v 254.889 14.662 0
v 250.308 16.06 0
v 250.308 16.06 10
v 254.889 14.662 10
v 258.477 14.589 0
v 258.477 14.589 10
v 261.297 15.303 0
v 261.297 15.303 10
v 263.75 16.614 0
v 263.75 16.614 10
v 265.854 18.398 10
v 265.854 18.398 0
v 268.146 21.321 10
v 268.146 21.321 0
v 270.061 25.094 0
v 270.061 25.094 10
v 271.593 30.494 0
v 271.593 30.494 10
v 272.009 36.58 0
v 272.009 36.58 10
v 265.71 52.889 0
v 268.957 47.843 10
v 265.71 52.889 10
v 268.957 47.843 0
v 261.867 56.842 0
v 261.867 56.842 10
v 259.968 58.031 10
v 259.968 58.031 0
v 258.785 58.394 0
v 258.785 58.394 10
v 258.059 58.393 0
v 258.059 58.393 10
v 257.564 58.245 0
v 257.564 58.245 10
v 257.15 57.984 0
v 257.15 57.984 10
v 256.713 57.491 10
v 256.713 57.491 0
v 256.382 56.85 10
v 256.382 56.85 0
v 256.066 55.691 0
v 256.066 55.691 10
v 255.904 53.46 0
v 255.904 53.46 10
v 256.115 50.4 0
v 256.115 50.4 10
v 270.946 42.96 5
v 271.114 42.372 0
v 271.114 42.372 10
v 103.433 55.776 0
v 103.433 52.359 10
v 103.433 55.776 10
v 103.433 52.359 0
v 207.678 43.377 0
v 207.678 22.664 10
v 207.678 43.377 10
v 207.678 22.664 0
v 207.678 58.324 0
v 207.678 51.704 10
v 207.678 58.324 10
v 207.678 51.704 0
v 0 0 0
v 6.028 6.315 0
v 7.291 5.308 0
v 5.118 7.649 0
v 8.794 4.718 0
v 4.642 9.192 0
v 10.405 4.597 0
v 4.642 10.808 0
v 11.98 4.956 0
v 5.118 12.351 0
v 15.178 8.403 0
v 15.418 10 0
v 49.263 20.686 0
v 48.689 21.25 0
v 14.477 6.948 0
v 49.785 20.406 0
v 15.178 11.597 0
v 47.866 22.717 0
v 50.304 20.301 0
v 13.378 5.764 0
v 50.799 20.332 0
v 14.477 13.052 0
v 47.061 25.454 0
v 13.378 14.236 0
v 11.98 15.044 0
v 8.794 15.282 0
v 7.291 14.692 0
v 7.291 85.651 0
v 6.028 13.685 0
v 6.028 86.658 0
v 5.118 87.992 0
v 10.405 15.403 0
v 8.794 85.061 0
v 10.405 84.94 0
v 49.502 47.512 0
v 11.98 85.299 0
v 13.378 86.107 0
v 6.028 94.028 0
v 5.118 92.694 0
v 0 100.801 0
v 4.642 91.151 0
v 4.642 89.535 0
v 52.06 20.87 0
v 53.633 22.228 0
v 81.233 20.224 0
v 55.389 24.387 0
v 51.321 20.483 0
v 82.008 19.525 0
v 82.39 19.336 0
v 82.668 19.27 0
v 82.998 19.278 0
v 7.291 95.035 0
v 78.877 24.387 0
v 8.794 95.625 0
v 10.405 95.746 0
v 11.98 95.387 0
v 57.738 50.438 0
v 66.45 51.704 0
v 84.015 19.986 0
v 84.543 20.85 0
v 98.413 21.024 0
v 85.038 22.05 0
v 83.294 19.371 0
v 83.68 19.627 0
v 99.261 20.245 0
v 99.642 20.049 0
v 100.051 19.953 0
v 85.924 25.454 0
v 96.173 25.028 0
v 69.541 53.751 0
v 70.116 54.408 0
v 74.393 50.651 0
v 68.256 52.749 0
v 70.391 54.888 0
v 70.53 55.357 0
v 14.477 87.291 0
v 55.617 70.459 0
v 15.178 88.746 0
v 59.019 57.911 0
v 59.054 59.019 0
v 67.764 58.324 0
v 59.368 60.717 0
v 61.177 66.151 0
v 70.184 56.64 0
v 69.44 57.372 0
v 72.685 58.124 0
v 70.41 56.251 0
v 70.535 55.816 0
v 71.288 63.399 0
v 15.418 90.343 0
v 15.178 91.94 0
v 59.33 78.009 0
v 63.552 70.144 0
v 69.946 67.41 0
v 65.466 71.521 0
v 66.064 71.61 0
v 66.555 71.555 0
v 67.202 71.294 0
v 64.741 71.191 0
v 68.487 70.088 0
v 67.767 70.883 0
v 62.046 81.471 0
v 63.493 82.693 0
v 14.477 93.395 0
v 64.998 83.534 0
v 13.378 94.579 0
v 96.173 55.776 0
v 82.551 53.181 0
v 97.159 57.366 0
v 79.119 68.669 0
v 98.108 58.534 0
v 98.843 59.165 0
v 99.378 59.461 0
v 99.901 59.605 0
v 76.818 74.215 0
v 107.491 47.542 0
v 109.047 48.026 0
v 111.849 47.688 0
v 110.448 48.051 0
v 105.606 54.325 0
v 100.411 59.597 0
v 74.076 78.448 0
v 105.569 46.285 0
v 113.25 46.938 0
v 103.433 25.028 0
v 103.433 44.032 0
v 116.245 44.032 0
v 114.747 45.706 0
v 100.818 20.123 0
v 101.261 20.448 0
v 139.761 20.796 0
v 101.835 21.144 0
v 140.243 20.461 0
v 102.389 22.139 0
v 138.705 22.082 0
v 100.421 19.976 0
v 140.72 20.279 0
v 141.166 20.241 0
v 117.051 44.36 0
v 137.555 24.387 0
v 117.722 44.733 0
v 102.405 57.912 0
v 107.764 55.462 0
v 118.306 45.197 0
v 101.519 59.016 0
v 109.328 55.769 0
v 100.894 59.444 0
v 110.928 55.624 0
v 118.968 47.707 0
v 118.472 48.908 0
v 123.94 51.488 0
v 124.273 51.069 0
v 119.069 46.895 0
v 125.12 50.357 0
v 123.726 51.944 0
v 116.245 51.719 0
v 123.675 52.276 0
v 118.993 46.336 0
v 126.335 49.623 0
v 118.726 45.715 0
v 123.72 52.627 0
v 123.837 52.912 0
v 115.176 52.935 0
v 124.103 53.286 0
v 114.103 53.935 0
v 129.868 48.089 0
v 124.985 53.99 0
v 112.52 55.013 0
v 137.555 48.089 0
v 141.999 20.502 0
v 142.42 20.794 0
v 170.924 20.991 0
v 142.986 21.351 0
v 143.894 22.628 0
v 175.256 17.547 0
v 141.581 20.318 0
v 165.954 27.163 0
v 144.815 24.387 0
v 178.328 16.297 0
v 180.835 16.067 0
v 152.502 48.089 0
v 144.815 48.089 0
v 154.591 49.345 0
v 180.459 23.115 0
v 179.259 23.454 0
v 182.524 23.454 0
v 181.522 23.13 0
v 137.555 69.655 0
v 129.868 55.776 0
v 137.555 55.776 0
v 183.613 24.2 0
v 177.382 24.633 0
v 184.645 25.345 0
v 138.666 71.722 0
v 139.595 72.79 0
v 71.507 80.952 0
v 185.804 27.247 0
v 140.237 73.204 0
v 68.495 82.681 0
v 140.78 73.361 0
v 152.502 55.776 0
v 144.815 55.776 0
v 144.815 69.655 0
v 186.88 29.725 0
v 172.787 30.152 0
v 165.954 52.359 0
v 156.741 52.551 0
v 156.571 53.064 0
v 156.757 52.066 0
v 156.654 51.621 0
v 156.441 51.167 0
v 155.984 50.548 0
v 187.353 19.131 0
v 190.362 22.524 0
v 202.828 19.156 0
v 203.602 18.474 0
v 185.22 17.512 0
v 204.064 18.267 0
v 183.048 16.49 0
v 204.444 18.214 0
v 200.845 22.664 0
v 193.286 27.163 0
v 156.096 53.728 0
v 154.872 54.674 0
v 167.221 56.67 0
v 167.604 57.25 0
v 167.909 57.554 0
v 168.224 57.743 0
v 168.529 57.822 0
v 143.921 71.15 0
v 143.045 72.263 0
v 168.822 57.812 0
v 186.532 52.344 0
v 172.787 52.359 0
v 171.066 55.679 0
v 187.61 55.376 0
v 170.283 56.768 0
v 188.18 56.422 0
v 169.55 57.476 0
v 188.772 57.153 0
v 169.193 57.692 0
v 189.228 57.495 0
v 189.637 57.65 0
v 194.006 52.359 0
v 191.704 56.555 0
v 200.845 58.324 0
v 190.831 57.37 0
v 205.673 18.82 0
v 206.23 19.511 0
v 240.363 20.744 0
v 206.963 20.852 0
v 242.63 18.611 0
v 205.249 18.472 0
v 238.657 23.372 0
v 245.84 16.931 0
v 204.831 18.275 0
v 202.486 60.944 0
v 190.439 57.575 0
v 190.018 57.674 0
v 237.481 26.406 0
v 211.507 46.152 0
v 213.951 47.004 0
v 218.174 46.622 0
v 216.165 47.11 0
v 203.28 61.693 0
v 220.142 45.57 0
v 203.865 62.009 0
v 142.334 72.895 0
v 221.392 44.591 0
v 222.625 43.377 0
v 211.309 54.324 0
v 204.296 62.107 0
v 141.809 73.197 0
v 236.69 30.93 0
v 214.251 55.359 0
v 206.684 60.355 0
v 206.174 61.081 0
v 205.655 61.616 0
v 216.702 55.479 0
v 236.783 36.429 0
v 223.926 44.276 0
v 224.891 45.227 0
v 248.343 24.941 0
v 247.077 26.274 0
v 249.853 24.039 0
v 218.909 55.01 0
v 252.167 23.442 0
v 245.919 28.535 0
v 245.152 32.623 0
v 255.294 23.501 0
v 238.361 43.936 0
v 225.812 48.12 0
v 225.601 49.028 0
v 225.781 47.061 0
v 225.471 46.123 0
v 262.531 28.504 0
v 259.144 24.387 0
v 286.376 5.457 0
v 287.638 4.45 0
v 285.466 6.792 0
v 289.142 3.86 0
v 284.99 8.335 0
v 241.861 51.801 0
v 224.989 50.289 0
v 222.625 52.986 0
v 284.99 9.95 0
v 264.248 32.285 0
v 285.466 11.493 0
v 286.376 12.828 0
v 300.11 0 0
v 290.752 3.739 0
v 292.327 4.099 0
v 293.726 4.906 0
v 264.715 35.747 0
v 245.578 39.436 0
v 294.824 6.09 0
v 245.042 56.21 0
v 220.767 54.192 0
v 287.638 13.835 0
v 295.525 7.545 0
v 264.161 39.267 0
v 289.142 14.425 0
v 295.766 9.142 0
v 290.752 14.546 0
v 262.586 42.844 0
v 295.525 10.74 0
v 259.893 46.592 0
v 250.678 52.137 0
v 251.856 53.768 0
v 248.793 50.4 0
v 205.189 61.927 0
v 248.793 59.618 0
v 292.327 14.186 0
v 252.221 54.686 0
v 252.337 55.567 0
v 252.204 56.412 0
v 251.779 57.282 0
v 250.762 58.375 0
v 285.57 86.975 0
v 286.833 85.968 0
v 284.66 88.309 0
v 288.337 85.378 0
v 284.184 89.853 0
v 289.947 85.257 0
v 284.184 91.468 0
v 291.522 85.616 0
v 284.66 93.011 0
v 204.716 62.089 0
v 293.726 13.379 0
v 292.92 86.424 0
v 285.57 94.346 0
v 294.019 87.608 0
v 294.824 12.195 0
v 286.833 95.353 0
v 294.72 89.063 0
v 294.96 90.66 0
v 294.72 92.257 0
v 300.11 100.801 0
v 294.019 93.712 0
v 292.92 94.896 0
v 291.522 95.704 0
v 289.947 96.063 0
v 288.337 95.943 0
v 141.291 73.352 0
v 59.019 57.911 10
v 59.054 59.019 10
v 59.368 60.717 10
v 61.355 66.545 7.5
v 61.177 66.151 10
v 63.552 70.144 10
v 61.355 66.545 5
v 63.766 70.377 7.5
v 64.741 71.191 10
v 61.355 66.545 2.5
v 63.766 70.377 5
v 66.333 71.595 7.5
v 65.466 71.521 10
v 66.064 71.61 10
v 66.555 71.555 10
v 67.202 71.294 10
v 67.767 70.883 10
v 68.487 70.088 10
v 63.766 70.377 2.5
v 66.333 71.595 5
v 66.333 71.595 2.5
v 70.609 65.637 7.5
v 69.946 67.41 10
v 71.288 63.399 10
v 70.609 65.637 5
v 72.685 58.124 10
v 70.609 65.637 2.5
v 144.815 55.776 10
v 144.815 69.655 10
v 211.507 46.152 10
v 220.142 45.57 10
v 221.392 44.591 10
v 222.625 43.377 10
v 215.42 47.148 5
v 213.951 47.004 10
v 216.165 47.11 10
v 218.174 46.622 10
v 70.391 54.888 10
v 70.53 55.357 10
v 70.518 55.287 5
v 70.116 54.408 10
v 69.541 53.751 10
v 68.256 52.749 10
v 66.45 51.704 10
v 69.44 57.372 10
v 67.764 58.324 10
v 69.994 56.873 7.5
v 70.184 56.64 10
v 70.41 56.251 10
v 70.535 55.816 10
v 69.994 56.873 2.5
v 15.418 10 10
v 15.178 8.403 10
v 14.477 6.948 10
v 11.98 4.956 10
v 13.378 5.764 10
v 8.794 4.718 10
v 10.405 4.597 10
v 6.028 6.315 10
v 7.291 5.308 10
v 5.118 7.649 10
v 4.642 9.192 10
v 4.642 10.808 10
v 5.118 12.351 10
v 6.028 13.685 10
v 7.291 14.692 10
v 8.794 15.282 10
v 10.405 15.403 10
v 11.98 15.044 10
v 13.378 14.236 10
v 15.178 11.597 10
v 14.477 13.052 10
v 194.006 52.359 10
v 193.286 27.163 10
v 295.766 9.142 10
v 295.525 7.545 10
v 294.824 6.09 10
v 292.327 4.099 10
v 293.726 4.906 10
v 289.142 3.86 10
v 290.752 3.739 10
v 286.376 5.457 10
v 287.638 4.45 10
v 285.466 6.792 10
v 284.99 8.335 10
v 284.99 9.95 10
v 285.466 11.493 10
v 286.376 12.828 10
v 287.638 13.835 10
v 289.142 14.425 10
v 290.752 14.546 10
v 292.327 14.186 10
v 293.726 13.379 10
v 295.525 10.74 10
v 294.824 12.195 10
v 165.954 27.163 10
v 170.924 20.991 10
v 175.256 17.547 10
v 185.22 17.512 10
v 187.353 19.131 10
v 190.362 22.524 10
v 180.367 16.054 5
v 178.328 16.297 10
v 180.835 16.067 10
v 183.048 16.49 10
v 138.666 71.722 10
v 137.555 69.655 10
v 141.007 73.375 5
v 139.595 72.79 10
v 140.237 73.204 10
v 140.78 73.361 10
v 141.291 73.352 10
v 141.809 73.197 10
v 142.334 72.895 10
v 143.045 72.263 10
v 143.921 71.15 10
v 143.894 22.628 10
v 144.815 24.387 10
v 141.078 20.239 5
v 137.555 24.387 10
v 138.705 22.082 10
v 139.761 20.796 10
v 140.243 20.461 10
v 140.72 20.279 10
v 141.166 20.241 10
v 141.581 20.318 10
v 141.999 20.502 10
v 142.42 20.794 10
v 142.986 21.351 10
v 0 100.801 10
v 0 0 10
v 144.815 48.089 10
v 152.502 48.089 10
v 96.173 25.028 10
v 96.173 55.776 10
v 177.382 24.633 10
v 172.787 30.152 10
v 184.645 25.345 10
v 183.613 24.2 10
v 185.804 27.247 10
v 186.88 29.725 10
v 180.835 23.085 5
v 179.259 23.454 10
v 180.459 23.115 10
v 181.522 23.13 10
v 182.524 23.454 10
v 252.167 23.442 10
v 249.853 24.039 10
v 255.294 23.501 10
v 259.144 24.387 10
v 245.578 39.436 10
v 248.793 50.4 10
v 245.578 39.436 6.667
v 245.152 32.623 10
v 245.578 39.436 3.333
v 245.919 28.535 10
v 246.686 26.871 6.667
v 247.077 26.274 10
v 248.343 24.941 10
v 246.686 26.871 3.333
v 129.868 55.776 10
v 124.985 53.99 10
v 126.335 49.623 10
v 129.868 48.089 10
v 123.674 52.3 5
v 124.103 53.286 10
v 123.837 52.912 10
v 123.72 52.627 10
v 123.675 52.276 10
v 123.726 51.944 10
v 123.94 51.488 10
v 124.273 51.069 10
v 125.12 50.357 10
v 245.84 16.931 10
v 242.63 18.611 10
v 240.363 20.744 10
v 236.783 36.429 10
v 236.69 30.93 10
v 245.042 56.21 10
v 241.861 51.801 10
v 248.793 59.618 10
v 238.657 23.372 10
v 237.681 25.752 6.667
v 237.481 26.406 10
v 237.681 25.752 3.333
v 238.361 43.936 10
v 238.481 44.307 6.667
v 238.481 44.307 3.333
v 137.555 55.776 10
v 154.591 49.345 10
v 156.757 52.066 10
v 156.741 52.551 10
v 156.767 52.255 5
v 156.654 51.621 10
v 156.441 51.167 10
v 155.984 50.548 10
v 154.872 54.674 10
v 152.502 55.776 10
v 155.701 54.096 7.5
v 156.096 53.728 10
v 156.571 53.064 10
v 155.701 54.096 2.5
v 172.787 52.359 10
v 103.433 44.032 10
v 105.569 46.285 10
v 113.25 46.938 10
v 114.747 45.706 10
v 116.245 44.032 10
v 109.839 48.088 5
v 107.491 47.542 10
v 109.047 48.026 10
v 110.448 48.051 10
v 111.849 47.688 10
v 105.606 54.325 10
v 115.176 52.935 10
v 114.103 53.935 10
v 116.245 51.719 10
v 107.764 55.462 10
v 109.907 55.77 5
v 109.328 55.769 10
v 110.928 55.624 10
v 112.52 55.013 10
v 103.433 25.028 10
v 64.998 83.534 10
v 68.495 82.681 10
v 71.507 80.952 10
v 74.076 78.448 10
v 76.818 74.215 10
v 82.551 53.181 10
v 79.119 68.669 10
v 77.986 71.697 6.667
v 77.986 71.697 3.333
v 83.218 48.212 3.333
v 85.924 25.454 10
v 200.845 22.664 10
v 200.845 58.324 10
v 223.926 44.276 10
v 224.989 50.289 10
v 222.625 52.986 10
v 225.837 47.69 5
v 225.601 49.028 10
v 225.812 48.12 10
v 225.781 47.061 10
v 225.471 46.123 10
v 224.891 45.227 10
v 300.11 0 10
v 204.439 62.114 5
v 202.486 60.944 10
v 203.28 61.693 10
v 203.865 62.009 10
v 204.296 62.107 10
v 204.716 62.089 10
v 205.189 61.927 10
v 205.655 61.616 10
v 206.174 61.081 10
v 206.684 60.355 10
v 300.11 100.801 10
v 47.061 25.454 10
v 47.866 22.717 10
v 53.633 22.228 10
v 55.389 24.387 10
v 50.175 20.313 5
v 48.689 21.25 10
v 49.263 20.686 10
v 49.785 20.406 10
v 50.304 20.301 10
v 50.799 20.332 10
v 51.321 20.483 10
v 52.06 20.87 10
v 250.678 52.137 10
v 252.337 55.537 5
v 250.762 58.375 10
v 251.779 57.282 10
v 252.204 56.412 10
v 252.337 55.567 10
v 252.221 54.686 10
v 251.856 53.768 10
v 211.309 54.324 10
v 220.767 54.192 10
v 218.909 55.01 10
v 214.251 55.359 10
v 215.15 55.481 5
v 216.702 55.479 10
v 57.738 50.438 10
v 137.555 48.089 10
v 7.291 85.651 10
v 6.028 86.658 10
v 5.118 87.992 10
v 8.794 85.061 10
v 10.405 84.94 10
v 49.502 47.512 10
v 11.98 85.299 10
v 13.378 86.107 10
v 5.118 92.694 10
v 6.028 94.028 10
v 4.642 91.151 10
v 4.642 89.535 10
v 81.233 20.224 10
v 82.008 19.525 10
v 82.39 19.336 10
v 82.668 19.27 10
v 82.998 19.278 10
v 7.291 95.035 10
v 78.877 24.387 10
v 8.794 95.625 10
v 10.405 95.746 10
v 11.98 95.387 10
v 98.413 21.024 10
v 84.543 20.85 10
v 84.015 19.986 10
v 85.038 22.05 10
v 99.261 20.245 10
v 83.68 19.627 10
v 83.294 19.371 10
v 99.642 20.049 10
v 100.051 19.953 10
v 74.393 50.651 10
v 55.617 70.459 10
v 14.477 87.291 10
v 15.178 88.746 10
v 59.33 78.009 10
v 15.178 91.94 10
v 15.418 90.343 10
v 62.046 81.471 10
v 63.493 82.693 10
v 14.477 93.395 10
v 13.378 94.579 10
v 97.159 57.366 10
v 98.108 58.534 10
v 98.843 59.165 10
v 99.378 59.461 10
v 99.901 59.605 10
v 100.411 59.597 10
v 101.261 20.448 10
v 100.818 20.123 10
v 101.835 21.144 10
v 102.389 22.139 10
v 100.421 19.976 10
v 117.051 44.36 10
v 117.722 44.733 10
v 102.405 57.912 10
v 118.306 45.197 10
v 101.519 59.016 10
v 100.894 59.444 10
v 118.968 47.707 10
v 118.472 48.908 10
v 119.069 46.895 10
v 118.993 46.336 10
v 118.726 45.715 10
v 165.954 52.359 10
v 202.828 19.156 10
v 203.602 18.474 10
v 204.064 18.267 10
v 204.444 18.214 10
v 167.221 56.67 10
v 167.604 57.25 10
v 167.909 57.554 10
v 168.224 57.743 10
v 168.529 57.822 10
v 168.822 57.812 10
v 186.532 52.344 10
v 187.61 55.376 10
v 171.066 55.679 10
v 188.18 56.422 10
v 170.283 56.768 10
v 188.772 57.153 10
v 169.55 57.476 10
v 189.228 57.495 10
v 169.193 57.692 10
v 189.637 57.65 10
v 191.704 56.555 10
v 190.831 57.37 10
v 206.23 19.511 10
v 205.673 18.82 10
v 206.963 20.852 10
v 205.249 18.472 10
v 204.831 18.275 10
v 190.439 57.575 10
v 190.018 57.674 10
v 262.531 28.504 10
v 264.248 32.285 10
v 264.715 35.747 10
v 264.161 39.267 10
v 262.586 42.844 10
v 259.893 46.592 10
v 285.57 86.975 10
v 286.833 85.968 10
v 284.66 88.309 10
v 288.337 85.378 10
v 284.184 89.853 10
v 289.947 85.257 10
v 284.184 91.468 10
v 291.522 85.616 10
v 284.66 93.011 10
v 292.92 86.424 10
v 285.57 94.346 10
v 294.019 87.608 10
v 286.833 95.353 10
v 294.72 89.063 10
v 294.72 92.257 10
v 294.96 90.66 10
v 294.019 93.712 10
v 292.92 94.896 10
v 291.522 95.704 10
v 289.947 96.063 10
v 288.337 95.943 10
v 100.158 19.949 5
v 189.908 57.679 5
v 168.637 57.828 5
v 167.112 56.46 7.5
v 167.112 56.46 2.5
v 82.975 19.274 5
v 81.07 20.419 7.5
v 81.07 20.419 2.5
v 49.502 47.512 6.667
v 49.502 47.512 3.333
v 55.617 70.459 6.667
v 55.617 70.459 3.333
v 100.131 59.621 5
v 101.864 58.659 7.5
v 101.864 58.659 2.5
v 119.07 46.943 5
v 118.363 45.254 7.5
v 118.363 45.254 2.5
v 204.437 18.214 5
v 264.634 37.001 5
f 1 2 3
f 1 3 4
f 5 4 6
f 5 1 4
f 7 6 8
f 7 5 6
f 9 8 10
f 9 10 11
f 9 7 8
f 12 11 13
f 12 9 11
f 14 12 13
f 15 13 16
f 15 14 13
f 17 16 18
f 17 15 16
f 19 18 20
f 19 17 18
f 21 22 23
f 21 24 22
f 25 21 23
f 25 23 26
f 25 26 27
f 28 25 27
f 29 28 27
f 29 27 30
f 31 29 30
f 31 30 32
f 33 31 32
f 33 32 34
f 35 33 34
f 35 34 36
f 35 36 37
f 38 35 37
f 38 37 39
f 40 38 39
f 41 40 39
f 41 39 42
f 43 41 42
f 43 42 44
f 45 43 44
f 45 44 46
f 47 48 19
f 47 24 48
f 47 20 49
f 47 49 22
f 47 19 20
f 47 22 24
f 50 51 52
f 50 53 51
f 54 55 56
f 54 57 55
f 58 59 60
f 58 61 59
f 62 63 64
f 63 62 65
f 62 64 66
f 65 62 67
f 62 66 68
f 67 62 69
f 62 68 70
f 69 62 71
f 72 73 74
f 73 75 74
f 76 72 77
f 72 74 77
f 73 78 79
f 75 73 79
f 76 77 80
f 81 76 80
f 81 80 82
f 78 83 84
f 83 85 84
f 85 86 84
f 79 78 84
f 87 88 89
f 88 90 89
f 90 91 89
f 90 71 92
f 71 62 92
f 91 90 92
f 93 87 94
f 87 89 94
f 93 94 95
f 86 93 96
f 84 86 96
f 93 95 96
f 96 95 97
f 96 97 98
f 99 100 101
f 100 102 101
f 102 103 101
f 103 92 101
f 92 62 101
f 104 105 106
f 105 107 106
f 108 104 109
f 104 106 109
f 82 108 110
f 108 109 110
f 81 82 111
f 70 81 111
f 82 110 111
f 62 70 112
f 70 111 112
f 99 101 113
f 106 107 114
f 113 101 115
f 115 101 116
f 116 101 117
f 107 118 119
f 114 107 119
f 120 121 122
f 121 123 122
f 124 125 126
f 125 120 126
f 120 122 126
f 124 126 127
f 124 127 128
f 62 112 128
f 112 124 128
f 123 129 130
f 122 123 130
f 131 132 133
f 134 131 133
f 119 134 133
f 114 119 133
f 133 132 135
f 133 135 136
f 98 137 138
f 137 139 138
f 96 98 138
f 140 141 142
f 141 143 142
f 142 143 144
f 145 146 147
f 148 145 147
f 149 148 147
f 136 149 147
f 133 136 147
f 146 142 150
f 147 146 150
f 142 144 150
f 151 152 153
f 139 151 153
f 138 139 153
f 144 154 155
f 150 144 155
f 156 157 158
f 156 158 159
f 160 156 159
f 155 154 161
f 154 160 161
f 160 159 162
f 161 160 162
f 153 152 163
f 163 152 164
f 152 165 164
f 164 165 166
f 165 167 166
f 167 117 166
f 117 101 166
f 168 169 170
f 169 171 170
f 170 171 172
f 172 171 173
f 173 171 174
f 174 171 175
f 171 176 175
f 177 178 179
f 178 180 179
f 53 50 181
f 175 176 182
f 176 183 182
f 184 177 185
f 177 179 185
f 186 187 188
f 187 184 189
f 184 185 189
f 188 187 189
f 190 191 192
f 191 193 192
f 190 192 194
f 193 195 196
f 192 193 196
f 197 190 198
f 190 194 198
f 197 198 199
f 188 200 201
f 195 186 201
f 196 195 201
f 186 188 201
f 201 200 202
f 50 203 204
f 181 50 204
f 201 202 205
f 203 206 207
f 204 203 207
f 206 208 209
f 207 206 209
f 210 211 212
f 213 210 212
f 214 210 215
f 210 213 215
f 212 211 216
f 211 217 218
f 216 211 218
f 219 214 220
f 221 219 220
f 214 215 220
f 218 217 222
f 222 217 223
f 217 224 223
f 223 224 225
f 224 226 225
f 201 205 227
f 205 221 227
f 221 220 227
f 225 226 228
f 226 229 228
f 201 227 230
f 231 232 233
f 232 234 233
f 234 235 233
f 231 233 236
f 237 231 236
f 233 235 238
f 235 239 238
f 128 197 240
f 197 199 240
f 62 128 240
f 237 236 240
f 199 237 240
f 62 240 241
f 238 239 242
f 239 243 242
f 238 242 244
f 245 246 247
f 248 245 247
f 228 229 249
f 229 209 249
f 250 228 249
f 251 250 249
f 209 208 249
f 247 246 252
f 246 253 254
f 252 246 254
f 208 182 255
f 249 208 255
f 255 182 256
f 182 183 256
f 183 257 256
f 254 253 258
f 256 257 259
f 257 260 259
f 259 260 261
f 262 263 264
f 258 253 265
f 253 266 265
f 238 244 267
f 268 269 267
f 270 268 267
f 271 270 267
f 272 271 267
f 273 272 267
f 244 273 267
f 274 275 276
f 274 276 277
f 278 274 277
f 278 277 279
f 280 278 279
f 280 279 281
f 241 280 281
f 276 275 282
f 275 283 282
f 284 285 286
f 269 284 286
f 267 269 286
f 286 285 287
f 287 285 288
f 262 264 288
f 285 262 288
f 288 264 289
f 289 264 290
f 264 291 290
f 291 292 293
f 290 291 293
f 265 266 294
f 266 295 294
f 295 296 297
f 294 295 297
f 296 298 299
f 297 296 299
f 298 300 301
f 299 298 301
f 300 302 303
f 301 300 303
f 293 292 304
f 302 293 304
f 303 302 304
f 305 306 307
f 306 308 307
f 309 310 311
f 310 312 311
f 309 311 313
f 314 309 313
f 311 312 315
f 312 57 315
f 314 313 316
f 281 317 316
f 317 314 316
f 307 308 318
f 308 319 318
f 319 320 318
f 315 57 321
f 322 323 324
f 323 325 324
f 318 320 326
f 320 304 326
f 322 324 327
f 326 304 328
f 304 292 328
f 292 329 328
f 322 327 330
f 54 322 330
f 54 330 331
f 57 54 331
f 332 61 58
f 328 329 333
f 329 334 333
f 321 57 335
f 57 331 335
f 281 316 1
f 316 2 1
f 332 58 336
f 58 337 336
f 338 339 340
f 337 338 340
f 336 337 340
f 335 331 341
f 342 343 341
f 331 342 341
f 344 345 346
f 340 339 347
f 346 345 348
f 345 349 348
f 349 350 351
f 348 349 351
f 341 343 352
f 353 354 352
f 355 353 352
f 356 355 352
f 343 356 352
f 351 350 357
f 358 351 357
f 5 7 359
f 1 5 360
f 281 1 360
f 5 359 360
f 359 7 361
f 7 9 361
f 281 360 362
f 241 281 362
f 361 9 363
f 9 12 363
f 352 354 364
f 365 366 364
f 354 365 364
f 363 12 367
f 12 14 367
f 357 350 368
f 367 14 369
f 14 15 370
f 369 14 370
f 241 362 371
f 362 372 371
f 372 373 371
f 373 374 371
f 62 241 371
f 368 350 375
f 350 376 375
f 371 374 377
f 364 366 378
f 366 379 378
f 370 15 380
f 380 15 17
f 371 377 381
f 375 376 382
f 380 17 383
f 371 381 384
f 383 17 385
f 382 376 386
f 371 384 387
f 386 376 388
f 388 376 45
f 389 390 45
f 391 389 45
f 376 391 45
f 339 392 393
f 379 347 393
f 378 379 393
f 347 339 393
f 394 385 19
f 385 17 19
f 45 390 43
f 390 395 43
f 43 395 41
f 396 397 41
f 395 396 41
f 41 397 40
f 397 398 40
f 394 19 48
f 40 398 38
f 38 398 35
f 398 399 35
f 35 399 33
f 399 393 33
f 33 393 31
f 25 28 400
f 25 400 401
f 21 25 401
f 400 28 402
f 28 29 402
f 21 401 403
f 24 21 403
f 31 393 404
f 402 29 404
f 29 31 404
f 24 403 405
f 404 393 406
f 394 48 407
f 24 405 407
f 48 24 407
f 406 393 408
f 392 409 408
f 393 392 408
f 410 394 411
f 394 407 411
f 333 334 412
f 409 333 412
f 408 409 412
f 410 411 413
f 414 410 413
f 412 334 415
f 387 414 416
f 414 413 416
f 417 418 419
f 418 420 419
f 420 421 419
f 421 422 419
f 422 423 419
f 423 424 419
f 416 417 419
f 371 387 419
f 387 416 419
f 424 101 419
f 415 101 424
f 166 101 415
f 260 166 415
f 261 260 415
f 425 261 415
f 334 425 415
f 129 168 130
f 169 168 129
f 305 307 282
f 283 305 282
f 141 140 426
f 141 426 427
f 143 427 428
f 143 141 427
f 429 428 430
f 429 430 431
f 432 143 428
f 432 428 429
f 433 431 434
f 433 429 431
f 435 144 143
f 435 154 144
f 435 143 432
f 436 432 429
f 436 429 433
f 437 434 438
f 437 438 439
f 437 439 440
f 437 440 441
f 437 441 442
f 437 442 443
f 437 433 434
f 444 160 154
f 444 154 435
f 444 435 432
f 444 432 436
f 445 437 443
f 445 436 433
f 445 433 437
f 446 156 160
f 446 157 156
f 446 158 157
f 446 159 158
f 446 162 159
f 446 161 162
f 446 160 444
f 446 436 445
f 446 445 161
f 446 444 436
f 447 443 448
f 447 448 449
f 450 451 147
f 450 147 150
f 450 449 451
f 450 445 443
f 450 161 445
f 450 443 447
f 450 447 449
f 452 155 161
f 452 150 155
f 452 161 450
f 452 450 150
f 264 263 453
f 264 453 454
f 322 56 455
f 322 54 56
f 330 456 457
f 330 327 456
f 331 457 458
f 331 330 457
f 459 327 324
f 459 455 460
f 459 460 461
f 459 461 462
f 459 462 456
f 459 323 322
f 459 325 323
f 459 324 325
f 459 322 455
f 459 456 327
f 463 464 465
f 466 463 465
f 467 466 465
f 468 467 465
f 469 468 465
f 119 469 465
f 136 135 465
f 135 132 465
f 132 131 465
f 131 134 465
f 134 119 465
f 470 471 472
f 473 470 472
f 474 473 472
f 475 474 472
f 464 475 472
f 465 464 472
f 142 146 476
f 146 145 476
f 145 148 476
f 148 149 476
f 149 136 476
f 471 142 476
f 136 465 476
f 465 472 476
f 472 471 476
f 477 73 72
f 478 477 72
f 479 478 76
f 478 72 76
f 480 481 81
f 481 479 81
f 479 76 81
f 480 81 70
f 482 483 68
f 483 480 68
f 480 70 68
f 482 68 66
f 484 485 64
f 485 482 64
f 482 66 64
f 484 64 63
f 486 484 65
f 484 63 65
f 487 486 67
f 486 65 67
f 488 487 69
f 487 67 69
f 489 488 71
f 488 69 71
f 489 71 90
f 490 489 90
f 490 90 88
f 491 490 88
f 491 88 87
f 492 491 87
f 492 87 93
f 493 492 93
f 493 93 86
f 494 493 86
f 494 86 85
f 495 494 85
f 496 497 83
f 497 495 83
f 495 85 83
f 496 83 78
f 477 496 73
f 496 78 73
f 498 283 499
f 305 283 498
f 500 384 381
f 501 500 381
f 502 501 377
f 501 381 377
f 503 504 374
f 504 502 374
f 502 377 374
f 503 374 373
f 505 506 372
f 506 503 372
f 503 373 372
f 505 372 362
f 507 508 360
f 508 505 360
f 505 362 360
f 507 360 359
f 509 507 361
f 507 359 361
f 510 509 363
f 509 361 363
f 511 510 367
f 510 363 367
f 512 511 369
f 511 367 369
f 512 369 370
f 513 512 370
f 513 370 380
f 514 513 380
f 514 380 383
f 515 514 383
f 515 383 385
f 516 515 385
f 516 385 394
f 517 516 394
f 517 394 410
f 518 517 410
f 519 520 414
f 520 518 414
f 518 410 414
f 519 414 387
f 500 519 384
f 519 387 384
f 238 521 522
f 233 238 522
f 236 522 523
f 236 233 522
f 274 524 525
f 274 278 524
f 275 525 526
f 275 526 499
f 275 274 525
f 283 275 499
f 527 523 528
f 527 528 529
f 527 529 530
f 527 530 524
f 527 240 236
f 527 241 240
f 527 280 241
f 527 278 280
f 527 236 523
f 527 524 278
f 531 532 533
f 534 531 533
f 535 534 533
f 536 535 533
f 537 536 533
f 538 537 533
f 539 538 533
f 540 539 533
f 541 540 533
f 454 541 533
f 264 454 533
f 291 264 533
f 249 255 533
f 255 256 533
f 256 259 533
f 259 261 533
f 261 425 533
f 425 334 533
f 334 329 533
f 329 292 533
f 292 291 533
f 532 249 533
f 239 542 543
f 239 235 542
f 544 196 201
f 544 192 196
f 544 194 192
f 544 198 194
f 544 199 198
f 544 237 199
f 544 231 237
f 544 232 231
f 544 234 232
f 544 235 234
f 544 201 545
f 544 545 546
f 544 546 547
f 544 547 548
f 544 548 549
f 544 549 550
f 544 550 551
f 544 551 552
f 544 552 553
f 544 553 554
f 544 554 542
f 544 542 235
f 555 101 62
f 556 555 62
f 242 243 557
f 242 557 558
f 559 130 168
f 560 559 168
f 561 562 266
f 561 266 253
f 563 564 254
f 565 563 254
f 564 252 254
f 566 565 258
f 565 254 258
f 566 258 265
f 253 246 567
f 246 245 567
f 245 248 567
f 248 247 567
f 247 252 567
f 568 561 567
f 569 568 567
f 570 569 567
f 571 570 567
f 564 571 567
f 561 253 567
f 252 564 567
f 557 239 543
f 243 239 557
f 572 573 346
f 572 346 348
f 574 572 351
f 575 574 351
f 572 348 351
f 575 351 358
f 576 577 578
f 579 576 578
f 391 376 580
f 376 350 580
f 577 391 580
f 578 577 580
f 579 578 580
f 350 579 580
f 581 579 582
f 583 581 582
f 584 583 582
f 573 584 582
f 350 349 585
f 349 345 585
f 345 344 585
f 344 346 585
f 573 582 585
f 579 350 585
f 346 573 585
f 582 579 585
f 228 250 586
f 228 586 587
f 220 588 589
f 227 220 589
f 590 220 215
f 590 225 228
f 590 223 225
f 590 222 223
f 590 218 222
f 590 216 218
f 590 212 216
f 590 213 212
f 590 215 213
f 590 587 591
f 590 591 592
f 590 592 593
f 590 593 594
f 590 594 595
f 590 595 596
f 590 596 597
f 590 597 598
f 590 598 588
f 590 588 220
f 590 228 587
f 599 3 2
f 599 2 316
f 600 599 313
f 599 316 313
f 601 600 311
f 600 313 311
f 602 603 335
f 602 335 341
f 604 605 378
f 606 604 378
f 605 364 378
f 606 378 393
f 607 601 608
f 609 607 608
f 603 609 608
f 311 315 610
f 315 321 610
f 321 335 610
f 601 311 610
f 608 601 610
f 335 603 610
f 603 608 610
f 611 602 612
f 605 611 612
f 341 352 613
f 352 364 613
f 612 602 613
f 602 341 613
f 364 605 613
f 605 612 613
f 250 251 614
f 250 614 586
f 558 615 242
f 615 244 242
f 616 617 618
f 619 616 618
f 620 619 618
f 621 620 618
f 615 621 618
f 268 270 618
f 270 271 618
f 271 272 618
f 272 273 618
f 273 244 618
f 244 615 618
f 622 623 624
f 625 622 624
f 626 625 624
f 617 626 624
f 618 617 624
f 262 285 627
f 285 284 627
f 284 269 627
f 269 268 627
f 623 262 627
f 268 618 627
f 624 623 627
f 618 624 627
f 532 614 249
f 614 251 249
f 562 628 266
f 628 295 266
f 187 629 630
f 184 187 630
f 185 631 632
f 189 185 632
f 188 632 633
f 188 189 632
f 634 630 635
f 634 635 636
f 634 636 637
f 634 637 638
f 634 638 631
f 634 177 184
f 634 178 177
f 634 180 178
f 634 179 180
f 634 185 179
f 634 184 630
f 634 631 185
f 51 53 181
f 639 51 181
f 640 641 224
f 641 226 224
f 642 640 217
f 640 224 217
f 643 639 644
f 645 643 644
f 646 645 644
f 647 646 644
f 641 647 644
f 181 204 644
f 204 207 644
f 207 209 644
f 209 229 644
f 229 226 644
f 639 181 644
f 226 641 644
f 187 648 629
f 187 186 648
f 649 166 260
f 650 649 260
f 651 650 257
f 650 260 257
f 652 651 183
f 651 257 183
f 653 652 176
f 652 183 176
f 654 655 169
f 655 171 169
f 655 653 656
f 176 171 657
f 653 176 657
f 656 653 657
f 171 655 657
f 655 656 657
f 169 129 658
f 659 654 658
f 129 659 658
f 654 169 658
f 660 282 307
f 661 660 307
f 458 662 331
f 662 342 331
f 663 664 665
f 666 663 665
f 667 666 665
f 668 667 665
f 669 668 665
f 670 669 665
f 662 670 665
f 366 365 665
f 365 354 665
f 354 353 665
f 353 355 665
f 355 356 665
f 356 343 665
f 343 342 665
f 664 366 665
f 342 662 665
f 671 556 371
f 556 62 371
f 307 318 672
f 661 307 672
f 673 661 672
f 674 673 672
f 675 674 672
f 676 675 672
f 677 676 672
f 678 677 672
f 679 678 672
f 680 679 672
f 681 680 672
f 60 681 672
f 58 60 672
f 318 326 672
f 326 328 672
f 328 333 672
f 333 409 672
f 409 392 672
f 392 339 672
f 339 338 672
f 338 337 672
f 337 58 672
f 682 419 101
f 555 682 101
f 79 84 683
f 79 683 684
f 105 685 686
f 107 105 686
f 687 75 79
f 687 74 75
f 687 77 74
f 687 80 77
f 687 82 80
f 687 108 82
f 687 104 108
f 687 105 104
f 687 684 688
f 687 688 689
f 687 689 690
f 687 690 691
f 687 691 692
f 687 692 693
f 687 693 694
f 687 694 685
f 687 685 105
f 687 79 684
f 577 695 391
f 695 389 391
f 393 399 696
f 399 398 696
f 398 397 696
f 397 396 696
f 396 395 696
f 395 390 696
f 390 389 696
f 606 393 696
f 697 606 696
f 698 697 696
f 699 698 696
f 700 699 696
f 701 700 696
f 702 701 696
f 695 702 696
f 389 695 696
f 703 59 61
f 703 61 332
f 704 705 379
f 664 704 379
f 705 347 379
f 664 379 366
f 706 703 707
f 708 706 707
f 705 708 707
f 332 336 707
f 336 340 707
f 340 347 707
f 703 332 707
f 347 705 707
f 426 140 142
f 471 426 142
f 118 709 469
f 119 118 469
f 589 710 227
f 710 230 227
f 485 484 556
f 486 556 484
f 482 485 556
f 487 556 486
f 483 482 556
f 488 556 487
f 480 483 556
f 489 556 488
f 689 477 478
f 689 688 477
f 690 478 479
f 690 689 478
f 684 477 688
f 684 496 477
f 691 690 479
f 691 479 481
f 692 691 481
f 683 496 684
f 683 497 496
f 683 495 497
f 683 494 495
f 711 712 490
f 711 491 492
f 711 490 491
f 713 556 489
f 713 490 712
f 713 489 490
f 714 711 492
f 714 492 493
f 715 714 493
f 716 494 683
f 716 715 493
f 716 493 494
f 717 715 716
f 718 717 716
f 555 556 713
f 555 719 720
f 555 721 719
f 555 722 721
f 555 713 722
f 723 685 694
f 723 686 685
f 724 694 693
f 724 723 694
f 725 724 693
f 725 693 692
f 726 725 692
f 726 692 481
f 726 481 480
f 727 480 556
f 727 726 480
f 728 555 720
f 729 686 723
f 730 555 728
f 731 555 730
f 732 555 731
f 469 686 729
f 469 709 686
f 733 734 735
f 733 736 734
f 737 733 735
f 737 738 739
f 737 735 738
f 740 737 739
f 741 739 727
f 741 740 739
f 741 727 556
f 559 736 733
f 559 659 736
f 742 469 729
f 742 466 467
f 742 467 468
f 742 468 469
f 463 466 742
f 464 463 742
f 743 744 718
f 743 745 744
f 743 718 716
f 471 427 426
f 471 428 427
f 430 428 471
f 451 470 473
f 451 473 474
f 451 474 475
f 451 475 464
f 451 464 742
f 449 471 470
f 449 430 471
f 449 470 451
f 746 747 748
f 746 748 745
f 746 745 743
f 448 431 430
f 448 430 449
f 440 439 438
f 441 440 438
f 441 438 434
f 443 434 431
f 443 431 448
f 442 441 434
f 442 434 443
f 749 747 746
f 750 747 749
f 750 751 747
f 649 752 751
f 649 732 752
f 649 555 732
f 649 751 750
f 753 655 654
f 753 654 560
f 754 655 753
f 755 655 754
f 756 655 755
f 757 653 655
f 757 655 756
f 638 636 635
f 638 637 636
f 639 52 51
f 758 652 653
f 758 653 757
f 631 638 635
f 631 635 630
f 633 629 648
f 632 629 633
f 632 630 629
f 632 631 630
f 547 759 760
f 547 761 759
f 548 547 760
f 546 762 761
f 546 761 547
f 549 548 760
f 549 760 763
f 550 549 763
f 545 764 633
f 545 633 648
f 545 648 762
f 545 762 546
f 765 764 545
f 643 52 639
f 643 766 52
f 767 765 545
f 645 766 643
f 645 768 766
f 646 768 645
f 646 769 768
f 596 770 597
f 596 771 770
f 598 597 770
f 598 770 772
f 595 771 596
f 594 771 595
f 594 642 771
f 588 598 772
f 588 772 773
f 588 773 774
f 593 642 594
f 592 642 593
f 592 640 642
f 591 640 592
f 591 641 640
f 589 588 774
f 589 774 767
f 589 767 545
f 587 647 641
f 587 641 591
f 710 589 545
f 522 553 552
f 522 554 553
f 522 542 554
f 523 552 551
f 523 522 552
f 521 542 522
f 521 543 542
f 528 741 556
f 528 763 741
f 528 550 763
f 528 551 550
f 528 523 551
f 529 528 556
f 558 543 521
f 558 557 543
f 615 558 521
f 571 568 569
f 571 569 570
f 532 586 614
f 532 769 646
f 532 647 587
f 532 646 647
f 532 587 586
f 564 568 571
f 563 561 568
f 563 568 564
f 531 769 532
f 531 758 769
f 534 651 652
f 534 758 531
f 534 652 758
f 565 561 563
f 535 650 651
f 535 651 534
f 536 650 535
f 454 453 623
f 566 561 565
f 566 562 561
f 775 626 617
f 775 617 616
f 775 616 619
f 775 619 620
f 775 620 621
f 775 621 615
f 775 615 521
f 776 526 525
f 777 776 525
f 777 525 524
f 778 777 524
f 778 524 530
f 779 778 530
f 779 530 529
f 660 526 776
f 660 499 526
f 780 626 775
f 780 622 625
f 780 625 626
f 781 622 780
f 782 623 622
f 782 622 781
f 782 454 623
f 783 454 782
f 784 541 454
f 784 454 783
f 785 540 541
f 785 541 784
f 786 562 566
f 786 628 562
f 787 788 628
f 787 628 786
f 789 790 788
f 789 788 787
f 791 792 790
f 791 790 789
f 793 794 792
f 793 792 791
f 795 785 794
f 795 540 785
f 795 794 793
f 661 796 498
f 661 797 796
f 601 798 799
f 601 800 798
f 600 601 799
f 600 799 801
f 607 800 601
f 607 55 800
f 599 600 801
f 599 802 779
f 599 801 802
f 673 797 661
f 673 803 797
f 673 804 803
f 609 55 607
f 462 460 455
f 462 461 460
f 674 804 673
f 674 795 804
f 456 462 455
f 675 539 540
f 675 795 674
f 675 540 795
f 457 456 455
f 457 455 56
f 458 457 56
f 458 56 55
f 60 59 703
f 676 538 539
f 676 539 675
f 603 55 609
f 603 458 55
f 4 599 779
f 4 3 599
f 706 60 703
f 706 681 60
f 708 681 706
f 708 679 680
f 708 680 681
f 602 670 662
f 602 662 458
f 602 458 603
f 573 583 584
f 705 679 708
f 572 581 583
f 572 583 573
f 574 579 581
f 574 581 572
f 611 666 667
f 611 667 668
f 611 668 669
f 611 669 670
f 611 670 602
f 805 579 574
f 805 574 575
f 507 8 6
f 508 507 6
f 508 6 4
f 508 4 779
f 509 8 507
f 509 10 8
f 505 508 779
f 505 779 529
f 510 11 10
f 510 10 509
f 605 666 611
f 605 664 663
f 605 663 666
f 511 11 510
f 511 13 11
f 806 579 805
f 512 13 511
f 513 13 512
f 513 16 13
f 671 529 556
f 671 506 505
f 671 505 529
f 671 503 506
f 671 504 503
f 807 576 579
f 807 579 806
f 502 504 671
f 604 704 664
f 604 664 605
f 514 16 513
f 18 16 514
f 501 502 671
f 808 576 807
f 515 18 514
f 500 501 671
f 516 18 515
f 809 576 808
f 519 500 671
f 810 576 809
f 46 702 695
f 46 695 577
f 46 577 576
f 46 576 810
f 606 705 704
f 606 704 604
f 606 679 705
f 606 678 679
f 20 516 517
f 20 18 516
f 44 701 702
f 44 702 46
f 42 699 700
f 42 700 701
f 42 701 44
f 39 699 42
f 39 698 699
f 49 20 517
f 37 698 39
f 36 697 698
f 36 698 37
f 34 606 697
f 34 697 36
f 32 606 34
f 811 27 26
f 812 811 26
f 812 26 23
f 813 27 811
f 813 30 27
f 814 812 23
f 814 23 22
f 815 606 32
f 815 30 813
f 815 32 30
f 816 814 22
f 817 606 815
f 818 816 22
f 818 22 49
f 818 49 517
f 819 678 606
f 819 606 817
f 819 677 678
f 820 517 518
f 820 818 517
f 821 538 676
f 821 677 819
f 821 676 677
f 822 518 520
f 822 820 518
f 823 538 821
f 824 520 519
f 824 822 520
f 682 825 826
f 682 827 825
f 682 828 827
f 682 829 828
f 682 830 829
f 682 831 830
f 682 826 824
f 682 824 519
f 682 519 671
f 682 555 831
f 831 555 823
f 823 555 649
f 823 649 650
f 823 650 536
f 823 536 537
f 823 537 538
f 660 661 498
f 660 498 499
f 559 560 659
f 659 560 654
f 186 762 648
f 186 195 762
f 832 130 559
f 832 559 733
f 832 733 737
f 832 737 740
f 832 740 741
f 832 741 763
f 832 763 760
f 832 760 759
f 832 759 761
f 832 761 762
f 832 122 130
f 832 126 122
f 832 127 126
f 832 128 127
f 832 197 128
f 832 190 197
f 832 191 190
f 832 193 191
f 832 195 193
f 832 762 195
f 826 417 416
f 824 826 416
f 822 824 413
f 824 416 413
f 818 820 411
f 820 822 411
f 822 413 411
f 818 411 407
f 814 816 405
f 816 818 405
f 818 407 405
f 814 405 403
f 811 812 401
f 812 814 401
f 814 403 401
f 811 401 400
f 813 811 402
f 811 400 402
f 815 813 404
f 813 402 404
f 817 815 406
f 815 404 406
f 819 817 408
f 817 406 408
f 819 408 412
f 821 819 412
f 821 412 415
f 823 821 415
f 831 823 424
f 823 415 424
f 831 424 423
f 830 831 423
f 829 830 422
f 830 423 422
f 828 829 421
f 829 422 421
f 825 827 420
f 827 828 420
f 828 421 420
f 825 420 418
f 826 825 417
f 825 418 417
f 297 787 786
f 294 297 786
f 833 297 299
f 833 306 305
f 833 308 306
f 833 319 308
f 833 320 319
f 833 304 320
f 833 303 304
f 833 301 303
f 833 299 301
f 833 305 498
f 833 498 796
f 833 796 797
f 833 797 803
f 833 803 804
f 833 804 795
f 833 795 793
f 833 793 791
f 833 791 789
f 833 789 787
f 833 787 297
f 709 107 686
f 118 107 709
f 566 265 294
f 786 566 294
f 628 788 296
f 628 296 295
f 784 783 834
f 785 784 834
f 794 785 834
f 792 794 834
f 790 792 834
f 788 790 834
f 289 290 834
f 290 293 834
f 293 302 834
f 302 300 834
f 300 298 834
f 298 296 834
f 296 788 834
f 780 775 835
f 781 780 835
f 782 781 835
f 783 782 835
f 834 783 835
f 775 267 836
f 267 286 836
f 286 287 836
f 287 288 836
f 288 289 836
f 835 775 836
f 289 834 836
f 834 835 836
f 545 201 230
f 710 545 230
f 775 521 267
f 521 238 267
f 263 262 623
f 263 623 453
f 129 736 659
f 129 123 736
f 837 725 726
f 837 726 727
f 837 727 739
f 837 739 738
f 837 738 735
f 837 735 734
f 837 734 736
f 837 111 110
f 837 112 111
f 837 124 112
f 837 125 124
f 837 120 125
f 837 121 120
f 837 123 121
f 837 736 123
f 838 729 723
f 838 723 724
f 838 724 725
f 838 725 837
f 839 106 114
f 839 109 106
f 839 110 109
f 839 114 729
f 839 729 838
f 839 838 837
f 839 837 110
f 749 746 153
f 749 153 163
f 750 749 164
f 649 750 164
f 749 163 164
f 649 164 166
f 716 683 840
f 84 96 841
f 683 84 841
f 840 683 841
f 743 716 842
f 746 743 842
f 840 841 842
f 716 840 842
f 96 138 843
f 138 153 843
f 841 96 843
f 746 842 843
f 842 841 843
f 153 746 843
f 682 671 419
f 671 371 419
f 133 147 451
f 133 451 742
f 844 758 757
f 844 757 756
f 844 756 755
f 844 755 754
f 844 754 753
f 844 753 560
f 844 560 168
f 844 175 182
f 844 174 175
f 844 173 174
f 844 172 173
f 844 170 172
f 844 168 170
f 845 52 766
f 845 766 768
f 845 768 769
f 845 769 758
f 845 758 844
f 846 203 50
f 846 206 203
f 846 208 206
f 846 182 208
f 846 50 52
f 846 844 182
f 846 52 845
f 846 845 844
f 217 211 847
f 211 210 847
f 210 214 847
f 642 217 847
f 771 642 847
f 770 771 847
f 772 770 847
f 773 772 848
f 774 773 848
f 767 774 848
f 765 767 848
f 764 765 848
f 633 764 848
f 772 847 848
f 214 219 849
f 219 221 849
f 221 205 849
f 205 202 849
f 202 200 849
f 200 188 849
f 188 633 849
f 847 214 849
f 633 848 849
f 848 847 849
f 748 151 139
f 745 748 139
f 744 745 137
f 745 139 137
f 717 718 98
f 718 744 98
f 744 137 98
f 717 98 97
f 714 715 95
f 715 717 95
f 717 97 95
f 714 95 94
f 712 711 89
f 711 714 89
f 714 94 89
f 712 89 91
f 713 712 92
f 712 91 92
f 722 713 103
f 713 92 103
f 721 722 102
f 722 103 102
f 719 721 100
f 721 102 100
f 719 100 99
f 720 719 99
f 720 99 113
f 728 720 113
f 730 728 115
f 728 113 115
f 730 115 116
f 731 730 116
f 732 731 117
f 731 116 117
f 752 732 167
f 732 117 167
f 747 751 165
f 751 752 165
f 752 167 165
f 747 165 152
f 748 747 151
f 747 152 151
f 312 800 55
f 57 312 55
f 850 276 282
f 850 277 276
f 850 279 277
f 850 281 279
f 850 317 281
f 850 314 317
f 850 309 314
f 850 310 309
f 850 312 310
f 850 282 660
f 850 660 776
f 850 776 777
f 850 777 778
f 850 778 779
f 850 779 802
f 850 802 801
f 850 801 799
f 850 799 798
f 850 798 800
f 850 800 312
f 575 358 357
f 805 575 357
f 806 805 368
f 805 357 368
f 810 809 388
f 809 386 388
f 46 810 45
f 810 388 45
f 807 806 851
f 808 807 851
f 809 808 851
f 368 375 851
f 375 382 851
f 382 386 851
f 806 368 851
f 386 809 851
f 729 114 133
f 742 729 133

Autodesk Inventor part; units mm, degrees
ref_plane "YZ Plane" through (0, 0, 0) normal (1, 0, 0) x (0, 1, 0)
ref_plane "XZ Plane" through (0, 0, 0) normal (0, 1, 0) x (-1, 0, 0)
ref_plane "XY Plane" through (0, 0, 0) normal (0, 0, 1) x (1, 0, 0)
sketch "Sketch2" plane through (0, 0, 0) normal (0, 0, 1) x (1, 0, 0)
  line L0 (0, 0) -> (300.1103, 0)
  line L1 (300.1103, 0) -> (300.1103, 100.8009)
  line L2 (300.1103, 100.8009) -> (0, 100.8009)
  line L3 (0, 100.8009) -> (0, 0)
  circle A0 centre (10, 90.343) radius 5.4183
  circle A1 centre (10, 10) radius 5.4183
  circle A2 centre (289.5422, 90.6602) radius 5.4183
  circle A3 centre (290.3474, 9.1425) radius 5.4183
  spline S0 degree 3 poles (47.0614, 25.4545) (47.528, 43.4805) (54.12, 78.9822) (64.9978, 83.5345) knots 0 0 0 0 1 1 1 1
  spline S1 degree 3 poles (64.9978, 83.5345) (83.6065, 81.6461) (82.7385, 43.7232) (85.9237, 25.4545) knots 0 0 0 0 1 1 1 1
  spline S2 degree 1 poles (55.389, 24.3869) (57.7378, 50.4375) knots 0 0 1 1
  spline S3 degree 2 poles (47.0614, 25.4545) (49.1255, 15.705) (55.389, 24.3869) knots 0 0 0 1 1 1
  spline S4 degree 1 poles (78.8772, 24.3869) (74.3931, 50.651) knots 0 0 1 1
  spline S5 degree 2 poles (78.8772, 24.3869) (83.5505, 13.6282) (85.9237, 25.4545) knots 0 0 0 1 1 1
  spline S6 degree 4 poles (59.019, 57.911) (58.4576, 61.6443) (68.1339, 91.1213) (71.7472, 59.0435) (72.6849, 58.1245) knots 0 0 0 0 0 1 1 1 1 1
  spline S7 degree 1 poles (96.1731, 25.0275) (96.1731, 55.7757) knots 0 0 1 1
  spline S8 degree 1 poles (103.4331, 25.0275) (103.4331, 44.0316) knots 0 0 1 1
  spline S9 degree 2 poles (103.4331, 44.0316) (109.8398, 52.1437) (116.2448, 44.0316) knots 0 0 0 1 1 1
  spline S10 degree 2 poles (103.4331, 52.3592) (109.9746, 59.5015) (116.2448, 51.7186) knots 0 0 0 1 1 1
  spline S11 degree 1 poles (103.4331, 52.3592) (103.4331, 55.7757) knots 0 0 1 1
  spline S12 degree 2 poles (103.4331, 55.7757) (100.4586, 63.4655) (96.1731, 55.7757) knots 0 0 0 1 1 1
  spline S13 degree 2 poles (116.2448, 51.7186) (121.8944, 46.0101) (116.2448, 44.0316) knots 0 0 0 1 1 1
  spline S14 degree 2 poles (96.1731, 25.0275) (100.5122, 14.8704) (103.4331, 25.0275) knots 0 0 0 1 1 1
  spline S15 degree 1 poles (137.5551, 24.3869) (137.5551, 48.0887) knots 0 0 1 1
  line L4 (144.815, 24.3869) -> (144.815, 48.0887)
  line L5 (144.815, 48.0887) -> (152.5021, 48.0887)
  line L6 (137.5551, 48.0887) -> (129.868, 48.0887)
  line L7 (137.5551, 55.7757) -> (129.868, 55.7757)
  line L8 (152.5021, 55.7757) -> (144.815, 55.7757)
  line L9 (144.815, 55.7757) -> (144.815, 69.6551)
  line L10 (137.5551, 55.7757) -> (137.5551, 69.6551)
  spline S16 degree 2 poles (137.5551, 24.3869) (140.9704, 16.0905) (144.815, 24.3869) knots 0 0 0 1 1 1
  spline S17 degree 2 poles (137.5551, 69.6551) (140.8285, 77.0951) (144.815, 69.6551) knots 0 0 0 1 1 1
  spline S18 degree 2 poles (152.5021, 55.7757) (161.0322, 52.5769) (152.5021, 48.0887) knots 0 0 0 1 1 1
  spline S19 degree 2 poles (129.868, 55.7757) (117.4806, 52.6672) (129.868, 48.0887) knots 0 0 0 1 1 1
  spline S20 degree 2 poles (165.9544, 27.1628) (181.1135, 4.9444) (193.2862, 27.1628) knots 0 0 0 1 1 1
  spline S21 degree 1 poles (165.9544, 27.1628) (165.9544, 52.359) knots 0 0 1 1
  spline S22 degree 1 poles (172.7874, 52.359) (172.7874, 30.1522) knots 0 0 1 1
  spline S23 degree 2 poles (172.7874, 30.1522) (181.8365, 16.2304) (186.8803, 29.7251) knots 0 0 0 1 1 1
  spline S24 degree 1 poles (186.8803, 29.7251) (186.5322, 52.344) knots 0 0 1 1
  spline S25 degree 1 poles (193.2862, 27.1628) (194.0062, 52.359) knots 0 0 1 1
  spline S26 degree 2 poles (165.9544, 52.359) (167.9027, 63.2961) (172.7874, 52.359) knots 0 0 0 1 1 1
  spline S27 degree 2 poles (194.0062, 52.359) (189.5472, 63.0062) (186.5322, 52.344) knots 0 0 0 1 1 1
  line L11 (200.8451, 22.6644) -> (200.8451, 58.3238)
  line L12 (207.6781, 22.6644) -> (207.6781, 43.3768)
  spline S28 degree 2 poles (200.8451, 22.6644) (204.6115, 13.7645) (207.6781, 22.6644) knots 0 0 0 1 1 1
  spline S29 degree 2 poles (207.6781, 43.3768) (215.6878, 50.9193) (222.6251, 43.3768) knots 0 0 0 1 1 1
  spline S30 degree 2 poles (207.6781, 51.7044) (215.1483, 58.6179) (222.6251, 52.9856) knots 0 0 0 1 1 1
  spline S31 degree 1 poles (207.6781, 51.7044) (207.6781, 58.3238) knots 0 0 1 1
  spline S32 degree 2 poles (200.8451, 58.3238) (204.6164, 65.9043) (207.6781, 58.3238) knots 0 0 0 1 1 1
  spline S33 degree 2 poles (222.6251, 52.9856) (229.0495, 47.1979) (222.6251, 43.3768) knots 0 0 0 1 1 1
  spline S34 degree 1 poles (59.019, 57.911) (67.7644, 58.3238) knots 0 0 1 1
  spline S35 degree 1 poles (57.7378, 50.4375) (66.4498, 51.7044) knots 0 0 1 1
  spline S36 degree 1 poles (72.6849, 58.1245) (74.3931, 50.651) knots 0 0 1 1
  spline S37 degree 2 poles (67.7644, 58.3238) (73.9281, 55.5594) (66.4498, 51.7044) knots 0 0 0 1 1 1
  spline S38 degree 3 poles (250.3077, 16.0597) (229.6641, 17.286) (235.0288, 49.9642) (248.7928, 59.6179) knots 0 0 0 0 1 1 1 1
  spline S39 degree 4 poles (250.3077, 16.0597) (265.1319, 9.4554) (277.4389, 34.9714) (273.4781, 48.5926) (254.3403, 65.288) (256.1147, 50.4005) knots 0 0 0 0 0 0.544263 1 1 1 1 1
  spline S40 degree 3 poles (248.7928, 50.4005) (245.7595, 44.1304) (238.6673, 17.9358) (259.1445, 24.3869) knots 0 0 0 0 1 1 1 1
  spline S41 degree 2 poles (259.1445, 24.3869) (271.6388, 36.6081) (256.1147, 50.4005) knots 0 0 0 1 1 1
  spline S42 degree 2 poles (248.7928, 59.6179) (255.8815, 56.0643) (248.7928, 50.4005) knots 0 0 0 1 1 1
  point P0 (50.0508, 50.4375)
  point P1 (57.7364, 75.2009)
  point P2 (76.3178, 75.1435)
  point P3 (82.9341, 50.4375)
  point P4 (50.0483, 20.3336)
  point P5 (82.9302, 19.2685)
  point P6 (62.1793, 68.1604)
  point P7 (66.4499, 71.5768)
  point P8 (70.5496, 65.8115)
  point P9 (109.8396, 48.0876)
  point P10 (109.8361, 55.7733)
  point P11 (100.2313, 59.6176)
  point P12 (119.033, 46.517)
  point P13 (100.2294, 19.9509)
  point P14 (141.048, 20.239)
  point P15 (140.9494, 73.3742)
  point P16 (156.7647, 52.3472)
  point P17 (123.6758, 52.3588)
  point P18 (180.6877, 16.0597)
  point P19 (181.2472, 23.0958)
  point P20 (168.5193, 57.821)
  point P21 (189.8394, 57.6769)
  point P22 (204.4763, 18.215)
  point P23 (215.5971, 47.1459)
  point P24 (215.3469, 55.4961)
  point P25 (204.4901, 62.1132)
  point P26 (225.828, 47.4324)
  point P27 (70.5492, 55.5893)
  point P28 (238.1887, 24.3868)
  point P29 (238.1887, 43.3767)
  point P30 (267.4763, 20.3332)
  point P31 (272.021, 36.2378)
  point P32 (267.4763, 50.4005)
  point P33 (259.1445, 58.3238)
  point P34 (245.763, 40.4941)
  point P35 (246.5206, 27.1626)
  point P36 (264.6991, 36.2378)
  point P37 (252.3275, 55.7757)
  dimension "d0" = 100.8009
  dimension "d1" = 300.1103
  dimension "d3" = 10.8366
  dimension "d4" = 10.8366
  dimension "d5" = 10.8366
  dimension "d6" = 10.8366
  dimension "d26" = 7.6871
  dimension "d27" = 8.541
  dimension "d28" = 8.3276
  dimension "d29" = 7.26
  dimension "d30" = 7.474
  dimension "d31" = 6.8329
  dimension "d32" = 7.26
  dimension "d33" = 8.3276
  dimension "d34" = 6.8329
extrude "Plate5" add sketch "Sketch2" along normal blind 10
equation "\"BendReliefDepth\" = 0.5 * Thickness"
equation "\"Thickness\" = 10"
properties part number "Name"
